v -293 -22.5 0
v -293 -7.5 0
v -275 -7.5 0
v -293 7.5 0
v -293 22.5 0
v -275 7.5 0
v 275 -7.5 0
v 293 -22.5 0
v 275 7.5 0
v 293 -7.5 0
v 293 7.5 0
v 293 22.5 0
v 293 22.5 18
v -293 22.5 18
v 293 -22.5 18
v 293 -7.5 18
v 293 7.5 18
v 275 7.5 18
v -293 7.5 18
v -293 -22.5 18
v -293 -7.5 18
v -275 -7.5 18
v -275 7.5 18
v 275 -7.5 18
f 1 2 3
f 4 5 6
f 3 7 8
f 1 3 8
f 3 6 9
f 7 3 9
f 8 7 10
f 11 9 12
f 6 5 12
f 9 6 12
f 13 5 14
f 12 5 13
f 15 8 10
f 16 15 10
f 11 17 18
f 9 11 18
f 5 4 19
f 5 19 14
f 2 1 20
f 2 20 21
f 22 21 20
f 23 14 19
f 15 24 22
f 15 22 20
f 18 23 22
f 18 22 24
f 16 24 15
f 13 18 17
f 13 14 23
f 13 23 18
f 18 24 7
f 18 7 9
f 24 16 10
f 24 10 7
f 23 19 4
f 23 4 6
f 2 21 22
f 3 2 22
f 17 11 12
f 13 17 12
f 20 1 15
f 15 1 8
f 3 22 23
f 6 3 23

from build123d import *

# Parameters (mm, degrees)
SKETCH1_W             = 586
SKETCH1_H             = 45
EXTRUDE_357_DEPTH     = 18
CUT_EXTRUDE_572_REACH = 296.413
SKETCH2_W             = 18
SKETCH2_H             = 15


with BuildPart() as part:
    # Sketch1 → Extrude 357 (new body)
    with BuildSketch(Plane.XY):
        Rectangle(SKETCH1_W, SKETCH1_H)
    extrude(amount=EXTRUDE_357_DEPTH)

    # Sketch2 → Cut-Extrude 572 (cut, up to next)
    with BuildSketch(Plane.XY.offset(18), mode=Mode.PRIVATE) as cut_extrude_572_sk1:
        with Locations((-284, 0)):
            Rectangle(SKETCH2_W, SKETCH2_H)
    cut_extrude_572_tool1 = extrude(cut_extrude_572_sk1.sketch, amount=-CUT_EXTRUDE_572_REACH, mode=Mode.PRIVATE) & part.part
    cut_extrude_572 = cut_extrude_572_tool1.solids().sort_by_distance((-284, 0, 18))[0]
    add(cut_extrude_572, mode=Mode.SUBTRACT)

    # Mirror1: Cut-Extrude 572 across plane
    add(cut_extrude_572.mirror(Plane(origin=(0, 0, 0), x_dir=(0, 0, 1), z_dir=(1, 0, 0))), mode=Mode.SUBTRACT)


solid = part.part
